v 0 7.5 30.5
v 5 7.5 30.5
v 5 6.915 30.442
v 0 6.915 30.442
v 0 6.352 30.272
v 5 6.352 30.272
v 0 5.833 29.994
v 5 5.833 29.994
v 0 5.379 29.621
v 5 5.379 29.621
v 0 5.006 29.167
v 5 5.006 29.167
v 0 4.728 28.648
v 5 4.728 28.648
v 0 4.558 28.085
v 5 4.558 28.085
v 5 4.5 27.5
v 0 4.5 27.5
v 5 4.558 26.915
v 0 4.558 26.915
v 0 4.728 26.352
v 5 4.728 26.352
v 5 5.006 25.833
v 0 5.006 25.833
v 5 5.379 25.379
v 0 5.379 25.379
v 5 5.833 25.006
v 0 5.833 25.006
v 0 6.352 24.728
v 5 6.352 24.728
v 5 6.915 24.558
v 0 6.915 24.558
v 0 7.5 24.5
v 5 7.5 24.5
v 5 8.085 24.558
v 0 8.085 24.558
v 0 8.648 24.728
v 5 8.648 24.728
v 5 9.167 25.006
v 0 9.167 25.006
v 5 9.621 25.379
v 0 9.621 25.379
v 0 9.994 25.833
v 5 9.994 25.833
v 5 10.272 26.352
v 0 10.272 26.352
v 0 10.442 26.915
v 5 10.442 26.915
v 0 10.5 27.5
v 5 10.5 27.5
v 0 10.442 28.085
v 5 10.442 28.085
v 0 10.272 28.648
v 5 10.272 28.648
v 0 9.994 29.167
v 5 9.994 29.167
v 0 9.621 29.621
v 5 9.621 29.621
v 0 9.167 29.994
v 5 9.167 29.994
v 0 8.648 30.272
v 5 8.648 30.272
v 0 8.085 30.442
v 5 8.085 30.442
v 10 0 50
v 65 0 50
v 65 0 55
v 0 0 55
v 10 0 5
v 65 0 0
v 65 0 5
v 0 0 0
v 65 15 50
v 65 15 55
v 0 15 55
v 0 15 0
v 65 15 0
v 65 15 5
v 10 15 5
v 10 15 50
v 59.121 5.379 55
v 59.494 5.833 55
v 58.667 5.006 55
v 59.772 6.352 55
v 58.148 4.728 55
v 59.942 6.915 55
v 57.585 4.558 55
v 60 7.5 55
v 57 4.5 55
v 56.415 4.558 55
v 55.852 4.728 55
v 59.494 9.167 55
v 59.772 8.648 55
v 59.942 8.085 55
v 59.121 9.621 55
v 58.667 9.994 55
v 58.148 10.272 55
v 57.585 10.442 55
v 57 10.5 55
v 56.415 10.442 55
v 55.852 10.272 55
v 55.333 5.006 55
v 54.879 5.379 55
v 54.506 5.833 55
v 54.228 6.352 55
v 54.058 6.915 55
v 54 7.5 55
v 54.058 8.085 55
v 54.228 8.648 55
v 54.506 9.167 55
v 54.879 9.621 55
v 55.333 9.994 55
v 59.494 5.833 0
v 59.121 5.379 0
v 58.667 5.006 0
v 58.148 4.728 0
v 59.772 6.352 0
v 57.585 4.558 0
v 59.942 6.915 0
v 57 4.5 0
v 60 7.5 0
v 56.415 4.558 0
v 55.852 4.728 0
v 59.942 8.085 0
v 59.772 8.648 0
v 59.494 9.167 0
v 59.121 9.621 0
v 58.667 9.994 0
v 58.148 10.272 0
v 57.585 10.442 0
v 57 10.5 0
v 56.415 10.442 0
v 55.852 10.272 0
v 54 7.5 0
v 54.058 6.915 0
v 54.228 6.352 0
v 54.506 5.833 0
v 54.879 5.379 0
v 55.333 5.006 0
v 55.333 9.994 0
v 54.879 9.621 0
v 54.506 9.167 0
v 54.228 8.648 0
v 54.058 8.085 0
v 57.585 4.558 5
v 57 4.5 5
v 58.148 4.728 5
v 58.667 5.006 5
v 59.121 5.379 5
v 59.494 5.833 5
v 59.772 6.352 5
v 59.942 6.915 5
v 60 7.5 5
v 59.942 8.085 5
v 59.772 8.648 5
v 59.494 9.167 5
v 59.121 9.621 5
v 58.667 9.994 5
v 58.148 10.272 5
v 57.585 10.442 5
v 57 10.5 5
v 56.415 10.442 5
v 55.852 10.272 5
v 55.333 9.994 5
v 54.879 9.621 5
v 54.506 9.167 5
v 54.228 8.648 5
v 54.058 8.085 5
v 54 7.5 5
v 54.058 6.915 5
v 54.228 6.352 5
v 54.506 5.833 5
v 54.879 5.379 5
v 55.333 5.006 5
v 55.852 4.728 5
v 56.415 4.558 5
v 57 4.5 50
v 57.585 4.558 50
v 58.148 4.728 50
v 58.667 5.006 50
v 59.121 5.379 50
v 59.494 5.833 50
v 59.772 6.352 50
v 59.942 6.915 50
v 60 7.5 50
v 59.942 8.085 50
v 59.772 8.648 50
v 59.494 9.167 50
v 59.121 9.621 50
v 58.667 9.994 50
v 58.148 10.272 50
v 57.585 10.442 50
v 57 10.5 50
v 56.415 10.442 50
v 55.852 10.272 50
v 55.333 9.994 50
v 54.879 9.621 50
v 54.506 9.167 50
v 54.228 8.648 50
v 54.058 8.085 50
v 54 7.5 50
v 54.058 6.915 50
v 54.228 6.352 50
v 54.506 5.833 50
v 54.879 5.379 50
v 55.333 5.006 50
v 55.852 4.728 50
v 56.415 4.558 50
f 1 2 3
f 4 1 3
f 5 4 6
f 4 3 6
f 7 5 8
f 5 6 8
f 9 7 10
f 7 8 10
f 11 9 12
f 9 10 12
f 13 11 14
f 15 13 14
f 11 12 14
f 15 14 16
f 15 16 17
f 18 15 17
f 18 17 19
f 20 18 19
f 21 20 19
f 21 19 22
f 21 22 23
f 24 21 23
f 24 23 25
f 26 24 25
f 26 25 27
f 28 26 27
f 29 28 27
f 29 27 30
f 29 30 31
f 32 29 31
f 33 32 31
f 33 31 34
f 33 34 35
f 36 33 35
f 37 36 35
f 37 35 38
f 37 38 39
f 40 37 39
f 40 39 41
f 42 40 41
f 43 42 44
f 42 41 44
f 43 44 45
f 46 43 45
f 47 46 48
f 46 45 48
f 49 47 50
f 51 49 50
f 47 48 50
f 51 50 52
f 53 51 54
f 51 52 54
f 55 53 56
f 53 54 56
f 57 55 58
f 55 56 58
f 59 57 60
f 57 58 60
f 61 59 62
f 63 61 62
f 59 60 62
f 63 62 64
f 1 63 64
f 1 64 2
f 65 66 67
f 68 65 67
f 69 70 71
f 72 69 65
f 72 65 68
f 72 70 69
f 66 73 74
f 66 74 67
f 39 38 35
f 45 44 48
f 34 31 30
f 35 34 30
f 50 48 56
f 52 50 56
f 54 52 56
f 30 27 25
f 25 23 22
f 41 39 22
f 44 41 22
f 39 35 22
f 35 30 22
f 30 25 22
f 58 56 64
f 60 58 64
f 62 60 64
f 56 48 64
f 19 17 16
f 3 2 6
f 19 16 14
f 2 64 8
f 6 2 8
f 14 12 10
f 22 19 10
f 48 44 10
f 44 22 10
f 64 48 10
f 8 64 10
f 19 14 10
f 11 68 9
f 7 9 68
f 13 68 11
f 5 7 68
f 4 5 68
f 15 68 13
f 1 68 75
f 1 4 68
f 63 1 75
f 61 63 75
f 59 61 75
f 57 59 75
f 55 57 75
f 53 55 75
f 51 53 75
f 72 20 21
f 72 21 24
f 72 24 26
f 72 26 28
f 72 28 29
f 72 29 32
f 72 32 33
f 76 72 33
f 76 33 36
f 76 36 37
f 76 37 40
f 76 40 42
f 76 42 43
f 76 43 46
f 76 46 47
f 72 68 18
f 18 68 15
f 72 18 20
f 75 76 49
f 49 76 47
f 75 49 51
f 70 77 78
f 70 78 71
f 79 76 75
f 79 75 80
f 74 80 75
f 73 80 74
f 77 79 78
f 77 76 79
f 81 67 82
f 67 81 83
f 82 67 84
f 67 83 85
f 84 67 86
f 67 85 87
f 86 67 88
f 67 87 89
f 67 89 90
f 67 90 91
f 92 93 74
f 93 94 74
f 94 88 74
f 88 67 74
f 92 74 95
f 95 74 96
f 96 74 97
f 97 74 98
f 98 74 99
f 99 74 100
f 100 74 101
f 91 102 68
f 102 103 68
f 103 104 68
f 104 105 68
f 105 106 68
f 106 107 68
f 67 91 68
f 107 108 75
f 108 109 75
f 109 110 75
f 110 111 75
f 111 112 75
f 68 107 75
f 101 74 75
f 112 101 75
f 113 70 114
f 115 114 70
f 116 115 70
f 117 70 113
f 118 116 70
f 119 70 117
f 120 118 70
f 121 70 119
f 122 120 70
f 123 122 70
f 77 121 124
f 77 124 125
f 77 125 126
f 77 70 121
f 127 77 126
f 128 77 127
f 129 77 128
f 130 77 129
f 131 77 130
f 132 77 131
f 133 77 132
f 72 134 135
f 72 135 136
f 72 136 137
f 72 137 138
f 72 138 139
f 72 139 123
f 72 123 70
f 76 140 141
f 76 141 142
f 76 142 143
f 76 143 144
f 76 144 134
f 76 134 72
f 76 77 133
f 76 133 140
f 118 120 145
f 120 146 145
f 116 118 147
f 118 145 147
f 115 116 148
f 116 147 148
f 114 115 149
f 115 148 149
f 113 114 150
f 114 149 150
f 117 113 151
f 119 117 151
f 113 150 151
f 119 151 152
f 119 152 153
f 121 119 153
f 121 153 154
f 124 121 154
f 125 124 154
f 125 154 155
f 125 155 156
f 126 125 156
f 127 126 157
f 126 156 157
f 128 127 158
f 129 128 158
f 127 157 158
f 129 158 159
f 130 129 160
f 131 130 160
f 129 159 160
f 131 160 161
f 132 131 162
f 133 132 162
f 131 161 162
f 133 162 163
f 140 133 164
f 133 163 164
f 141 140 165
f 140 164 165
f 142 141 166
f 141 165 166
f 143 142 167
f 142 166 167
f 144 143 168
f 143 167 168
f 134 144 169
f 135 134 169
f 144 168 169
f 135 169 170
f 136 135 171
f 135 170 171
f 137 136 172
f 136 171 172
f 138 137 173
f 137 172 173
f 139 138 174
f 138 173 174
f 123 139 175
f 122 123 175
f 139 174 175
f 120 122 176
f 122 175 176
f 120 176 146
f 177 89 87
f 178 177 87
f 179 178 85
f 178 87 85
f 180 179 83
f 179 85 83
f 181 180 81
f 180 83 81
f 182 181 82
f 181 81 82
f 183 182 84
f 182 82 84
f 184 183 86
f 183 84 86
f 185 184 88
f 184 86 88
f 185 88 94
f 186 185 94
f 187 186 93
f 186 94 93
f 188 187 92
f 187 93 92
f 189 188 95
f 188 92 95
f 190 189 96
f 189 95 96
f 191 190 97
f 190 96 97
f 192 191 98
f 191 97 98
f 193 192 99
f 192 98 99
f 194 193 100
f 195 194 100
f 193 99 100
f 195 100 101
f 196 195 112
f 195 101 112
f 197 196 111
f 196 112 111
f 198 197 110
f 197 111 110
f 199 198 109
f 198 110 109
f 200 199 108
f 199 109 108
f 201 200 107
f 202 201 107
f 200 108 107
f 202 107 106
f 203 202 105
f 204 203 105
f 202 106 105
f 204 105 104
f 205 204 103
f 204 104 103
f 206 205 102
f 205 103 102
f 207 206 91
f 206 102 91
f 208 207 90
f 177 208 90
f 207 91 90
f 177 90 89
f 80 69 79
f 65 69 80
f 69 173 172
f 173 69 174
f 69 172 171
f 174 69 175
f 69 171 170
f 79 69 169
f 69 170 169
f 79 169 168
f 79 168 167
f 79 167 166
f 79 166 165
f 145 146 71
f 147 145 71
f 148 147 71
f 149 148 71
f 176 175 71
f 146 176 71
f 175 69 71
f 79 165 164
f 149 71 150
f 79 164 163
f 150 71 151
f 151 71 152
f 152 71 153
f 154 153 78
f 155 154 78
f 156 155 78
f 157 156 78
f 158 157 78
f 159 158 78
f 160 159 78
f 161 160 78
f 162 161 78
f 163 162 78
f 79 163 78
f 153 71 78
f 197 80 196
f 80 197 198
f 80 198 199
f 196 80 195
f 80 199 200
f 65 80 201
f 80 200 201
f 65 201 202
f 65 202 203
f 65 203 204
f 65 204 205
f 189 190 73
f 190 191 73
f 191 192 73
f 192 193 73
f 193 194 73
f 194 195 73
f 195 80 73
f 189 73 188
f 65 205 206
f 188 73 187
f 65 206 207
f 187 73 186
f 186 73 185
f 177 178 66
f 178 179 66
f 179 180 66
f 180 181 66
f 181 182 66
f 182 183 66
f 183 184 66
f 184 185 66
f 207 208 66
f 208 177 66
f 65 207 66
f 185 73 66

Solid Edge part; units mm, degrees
sketch "Sketch1" plane through (0, 0, 0) normal (0, 0, 1) x (1, 0, 0)
  line L0 (0, 0) -> (0, 15)
  line L1 (0, 15) -> (65, 15)
  line L2 (65, 15) -> (65, 0)
  line L3 (65, 0) -> (0, 0)
  dimension "D1" = 65
  dimension "D2" = 15
extrude "Protrusion1" add sketch "Sketch1" along normal blind 55
sketch "Sketch2" plane through (65, 7.5, 27.5) normal (1, 0, 0) x (0, 0, -1)
  line L0 (-22.5, 7.5) -> (-22.5, -7.5)
  line L1 (-22.5, -7.5) -> (22.5, -7.5)
  line L2 (22.5, -7.5) -> (22.5, 7.5)
  line L3 (22.5, 7.5) -> (-22.5, 7.5)
  dimension "D1" = 45
  dimension "D2" = 5
extrude "ExtrudedCutout_1" cut sketch "Sketch2" against normal blind 55
hole "Hål_till_pedal" at (57, 7.5, 55) direction (0, 0, -1) diameter 6 end through all
hole "Hål_till_kolvstång" at (0, 7.5, 27.5) direction (1, 0, 0) diameter 6 depth 5
properties material "Aluminum, 1060"
